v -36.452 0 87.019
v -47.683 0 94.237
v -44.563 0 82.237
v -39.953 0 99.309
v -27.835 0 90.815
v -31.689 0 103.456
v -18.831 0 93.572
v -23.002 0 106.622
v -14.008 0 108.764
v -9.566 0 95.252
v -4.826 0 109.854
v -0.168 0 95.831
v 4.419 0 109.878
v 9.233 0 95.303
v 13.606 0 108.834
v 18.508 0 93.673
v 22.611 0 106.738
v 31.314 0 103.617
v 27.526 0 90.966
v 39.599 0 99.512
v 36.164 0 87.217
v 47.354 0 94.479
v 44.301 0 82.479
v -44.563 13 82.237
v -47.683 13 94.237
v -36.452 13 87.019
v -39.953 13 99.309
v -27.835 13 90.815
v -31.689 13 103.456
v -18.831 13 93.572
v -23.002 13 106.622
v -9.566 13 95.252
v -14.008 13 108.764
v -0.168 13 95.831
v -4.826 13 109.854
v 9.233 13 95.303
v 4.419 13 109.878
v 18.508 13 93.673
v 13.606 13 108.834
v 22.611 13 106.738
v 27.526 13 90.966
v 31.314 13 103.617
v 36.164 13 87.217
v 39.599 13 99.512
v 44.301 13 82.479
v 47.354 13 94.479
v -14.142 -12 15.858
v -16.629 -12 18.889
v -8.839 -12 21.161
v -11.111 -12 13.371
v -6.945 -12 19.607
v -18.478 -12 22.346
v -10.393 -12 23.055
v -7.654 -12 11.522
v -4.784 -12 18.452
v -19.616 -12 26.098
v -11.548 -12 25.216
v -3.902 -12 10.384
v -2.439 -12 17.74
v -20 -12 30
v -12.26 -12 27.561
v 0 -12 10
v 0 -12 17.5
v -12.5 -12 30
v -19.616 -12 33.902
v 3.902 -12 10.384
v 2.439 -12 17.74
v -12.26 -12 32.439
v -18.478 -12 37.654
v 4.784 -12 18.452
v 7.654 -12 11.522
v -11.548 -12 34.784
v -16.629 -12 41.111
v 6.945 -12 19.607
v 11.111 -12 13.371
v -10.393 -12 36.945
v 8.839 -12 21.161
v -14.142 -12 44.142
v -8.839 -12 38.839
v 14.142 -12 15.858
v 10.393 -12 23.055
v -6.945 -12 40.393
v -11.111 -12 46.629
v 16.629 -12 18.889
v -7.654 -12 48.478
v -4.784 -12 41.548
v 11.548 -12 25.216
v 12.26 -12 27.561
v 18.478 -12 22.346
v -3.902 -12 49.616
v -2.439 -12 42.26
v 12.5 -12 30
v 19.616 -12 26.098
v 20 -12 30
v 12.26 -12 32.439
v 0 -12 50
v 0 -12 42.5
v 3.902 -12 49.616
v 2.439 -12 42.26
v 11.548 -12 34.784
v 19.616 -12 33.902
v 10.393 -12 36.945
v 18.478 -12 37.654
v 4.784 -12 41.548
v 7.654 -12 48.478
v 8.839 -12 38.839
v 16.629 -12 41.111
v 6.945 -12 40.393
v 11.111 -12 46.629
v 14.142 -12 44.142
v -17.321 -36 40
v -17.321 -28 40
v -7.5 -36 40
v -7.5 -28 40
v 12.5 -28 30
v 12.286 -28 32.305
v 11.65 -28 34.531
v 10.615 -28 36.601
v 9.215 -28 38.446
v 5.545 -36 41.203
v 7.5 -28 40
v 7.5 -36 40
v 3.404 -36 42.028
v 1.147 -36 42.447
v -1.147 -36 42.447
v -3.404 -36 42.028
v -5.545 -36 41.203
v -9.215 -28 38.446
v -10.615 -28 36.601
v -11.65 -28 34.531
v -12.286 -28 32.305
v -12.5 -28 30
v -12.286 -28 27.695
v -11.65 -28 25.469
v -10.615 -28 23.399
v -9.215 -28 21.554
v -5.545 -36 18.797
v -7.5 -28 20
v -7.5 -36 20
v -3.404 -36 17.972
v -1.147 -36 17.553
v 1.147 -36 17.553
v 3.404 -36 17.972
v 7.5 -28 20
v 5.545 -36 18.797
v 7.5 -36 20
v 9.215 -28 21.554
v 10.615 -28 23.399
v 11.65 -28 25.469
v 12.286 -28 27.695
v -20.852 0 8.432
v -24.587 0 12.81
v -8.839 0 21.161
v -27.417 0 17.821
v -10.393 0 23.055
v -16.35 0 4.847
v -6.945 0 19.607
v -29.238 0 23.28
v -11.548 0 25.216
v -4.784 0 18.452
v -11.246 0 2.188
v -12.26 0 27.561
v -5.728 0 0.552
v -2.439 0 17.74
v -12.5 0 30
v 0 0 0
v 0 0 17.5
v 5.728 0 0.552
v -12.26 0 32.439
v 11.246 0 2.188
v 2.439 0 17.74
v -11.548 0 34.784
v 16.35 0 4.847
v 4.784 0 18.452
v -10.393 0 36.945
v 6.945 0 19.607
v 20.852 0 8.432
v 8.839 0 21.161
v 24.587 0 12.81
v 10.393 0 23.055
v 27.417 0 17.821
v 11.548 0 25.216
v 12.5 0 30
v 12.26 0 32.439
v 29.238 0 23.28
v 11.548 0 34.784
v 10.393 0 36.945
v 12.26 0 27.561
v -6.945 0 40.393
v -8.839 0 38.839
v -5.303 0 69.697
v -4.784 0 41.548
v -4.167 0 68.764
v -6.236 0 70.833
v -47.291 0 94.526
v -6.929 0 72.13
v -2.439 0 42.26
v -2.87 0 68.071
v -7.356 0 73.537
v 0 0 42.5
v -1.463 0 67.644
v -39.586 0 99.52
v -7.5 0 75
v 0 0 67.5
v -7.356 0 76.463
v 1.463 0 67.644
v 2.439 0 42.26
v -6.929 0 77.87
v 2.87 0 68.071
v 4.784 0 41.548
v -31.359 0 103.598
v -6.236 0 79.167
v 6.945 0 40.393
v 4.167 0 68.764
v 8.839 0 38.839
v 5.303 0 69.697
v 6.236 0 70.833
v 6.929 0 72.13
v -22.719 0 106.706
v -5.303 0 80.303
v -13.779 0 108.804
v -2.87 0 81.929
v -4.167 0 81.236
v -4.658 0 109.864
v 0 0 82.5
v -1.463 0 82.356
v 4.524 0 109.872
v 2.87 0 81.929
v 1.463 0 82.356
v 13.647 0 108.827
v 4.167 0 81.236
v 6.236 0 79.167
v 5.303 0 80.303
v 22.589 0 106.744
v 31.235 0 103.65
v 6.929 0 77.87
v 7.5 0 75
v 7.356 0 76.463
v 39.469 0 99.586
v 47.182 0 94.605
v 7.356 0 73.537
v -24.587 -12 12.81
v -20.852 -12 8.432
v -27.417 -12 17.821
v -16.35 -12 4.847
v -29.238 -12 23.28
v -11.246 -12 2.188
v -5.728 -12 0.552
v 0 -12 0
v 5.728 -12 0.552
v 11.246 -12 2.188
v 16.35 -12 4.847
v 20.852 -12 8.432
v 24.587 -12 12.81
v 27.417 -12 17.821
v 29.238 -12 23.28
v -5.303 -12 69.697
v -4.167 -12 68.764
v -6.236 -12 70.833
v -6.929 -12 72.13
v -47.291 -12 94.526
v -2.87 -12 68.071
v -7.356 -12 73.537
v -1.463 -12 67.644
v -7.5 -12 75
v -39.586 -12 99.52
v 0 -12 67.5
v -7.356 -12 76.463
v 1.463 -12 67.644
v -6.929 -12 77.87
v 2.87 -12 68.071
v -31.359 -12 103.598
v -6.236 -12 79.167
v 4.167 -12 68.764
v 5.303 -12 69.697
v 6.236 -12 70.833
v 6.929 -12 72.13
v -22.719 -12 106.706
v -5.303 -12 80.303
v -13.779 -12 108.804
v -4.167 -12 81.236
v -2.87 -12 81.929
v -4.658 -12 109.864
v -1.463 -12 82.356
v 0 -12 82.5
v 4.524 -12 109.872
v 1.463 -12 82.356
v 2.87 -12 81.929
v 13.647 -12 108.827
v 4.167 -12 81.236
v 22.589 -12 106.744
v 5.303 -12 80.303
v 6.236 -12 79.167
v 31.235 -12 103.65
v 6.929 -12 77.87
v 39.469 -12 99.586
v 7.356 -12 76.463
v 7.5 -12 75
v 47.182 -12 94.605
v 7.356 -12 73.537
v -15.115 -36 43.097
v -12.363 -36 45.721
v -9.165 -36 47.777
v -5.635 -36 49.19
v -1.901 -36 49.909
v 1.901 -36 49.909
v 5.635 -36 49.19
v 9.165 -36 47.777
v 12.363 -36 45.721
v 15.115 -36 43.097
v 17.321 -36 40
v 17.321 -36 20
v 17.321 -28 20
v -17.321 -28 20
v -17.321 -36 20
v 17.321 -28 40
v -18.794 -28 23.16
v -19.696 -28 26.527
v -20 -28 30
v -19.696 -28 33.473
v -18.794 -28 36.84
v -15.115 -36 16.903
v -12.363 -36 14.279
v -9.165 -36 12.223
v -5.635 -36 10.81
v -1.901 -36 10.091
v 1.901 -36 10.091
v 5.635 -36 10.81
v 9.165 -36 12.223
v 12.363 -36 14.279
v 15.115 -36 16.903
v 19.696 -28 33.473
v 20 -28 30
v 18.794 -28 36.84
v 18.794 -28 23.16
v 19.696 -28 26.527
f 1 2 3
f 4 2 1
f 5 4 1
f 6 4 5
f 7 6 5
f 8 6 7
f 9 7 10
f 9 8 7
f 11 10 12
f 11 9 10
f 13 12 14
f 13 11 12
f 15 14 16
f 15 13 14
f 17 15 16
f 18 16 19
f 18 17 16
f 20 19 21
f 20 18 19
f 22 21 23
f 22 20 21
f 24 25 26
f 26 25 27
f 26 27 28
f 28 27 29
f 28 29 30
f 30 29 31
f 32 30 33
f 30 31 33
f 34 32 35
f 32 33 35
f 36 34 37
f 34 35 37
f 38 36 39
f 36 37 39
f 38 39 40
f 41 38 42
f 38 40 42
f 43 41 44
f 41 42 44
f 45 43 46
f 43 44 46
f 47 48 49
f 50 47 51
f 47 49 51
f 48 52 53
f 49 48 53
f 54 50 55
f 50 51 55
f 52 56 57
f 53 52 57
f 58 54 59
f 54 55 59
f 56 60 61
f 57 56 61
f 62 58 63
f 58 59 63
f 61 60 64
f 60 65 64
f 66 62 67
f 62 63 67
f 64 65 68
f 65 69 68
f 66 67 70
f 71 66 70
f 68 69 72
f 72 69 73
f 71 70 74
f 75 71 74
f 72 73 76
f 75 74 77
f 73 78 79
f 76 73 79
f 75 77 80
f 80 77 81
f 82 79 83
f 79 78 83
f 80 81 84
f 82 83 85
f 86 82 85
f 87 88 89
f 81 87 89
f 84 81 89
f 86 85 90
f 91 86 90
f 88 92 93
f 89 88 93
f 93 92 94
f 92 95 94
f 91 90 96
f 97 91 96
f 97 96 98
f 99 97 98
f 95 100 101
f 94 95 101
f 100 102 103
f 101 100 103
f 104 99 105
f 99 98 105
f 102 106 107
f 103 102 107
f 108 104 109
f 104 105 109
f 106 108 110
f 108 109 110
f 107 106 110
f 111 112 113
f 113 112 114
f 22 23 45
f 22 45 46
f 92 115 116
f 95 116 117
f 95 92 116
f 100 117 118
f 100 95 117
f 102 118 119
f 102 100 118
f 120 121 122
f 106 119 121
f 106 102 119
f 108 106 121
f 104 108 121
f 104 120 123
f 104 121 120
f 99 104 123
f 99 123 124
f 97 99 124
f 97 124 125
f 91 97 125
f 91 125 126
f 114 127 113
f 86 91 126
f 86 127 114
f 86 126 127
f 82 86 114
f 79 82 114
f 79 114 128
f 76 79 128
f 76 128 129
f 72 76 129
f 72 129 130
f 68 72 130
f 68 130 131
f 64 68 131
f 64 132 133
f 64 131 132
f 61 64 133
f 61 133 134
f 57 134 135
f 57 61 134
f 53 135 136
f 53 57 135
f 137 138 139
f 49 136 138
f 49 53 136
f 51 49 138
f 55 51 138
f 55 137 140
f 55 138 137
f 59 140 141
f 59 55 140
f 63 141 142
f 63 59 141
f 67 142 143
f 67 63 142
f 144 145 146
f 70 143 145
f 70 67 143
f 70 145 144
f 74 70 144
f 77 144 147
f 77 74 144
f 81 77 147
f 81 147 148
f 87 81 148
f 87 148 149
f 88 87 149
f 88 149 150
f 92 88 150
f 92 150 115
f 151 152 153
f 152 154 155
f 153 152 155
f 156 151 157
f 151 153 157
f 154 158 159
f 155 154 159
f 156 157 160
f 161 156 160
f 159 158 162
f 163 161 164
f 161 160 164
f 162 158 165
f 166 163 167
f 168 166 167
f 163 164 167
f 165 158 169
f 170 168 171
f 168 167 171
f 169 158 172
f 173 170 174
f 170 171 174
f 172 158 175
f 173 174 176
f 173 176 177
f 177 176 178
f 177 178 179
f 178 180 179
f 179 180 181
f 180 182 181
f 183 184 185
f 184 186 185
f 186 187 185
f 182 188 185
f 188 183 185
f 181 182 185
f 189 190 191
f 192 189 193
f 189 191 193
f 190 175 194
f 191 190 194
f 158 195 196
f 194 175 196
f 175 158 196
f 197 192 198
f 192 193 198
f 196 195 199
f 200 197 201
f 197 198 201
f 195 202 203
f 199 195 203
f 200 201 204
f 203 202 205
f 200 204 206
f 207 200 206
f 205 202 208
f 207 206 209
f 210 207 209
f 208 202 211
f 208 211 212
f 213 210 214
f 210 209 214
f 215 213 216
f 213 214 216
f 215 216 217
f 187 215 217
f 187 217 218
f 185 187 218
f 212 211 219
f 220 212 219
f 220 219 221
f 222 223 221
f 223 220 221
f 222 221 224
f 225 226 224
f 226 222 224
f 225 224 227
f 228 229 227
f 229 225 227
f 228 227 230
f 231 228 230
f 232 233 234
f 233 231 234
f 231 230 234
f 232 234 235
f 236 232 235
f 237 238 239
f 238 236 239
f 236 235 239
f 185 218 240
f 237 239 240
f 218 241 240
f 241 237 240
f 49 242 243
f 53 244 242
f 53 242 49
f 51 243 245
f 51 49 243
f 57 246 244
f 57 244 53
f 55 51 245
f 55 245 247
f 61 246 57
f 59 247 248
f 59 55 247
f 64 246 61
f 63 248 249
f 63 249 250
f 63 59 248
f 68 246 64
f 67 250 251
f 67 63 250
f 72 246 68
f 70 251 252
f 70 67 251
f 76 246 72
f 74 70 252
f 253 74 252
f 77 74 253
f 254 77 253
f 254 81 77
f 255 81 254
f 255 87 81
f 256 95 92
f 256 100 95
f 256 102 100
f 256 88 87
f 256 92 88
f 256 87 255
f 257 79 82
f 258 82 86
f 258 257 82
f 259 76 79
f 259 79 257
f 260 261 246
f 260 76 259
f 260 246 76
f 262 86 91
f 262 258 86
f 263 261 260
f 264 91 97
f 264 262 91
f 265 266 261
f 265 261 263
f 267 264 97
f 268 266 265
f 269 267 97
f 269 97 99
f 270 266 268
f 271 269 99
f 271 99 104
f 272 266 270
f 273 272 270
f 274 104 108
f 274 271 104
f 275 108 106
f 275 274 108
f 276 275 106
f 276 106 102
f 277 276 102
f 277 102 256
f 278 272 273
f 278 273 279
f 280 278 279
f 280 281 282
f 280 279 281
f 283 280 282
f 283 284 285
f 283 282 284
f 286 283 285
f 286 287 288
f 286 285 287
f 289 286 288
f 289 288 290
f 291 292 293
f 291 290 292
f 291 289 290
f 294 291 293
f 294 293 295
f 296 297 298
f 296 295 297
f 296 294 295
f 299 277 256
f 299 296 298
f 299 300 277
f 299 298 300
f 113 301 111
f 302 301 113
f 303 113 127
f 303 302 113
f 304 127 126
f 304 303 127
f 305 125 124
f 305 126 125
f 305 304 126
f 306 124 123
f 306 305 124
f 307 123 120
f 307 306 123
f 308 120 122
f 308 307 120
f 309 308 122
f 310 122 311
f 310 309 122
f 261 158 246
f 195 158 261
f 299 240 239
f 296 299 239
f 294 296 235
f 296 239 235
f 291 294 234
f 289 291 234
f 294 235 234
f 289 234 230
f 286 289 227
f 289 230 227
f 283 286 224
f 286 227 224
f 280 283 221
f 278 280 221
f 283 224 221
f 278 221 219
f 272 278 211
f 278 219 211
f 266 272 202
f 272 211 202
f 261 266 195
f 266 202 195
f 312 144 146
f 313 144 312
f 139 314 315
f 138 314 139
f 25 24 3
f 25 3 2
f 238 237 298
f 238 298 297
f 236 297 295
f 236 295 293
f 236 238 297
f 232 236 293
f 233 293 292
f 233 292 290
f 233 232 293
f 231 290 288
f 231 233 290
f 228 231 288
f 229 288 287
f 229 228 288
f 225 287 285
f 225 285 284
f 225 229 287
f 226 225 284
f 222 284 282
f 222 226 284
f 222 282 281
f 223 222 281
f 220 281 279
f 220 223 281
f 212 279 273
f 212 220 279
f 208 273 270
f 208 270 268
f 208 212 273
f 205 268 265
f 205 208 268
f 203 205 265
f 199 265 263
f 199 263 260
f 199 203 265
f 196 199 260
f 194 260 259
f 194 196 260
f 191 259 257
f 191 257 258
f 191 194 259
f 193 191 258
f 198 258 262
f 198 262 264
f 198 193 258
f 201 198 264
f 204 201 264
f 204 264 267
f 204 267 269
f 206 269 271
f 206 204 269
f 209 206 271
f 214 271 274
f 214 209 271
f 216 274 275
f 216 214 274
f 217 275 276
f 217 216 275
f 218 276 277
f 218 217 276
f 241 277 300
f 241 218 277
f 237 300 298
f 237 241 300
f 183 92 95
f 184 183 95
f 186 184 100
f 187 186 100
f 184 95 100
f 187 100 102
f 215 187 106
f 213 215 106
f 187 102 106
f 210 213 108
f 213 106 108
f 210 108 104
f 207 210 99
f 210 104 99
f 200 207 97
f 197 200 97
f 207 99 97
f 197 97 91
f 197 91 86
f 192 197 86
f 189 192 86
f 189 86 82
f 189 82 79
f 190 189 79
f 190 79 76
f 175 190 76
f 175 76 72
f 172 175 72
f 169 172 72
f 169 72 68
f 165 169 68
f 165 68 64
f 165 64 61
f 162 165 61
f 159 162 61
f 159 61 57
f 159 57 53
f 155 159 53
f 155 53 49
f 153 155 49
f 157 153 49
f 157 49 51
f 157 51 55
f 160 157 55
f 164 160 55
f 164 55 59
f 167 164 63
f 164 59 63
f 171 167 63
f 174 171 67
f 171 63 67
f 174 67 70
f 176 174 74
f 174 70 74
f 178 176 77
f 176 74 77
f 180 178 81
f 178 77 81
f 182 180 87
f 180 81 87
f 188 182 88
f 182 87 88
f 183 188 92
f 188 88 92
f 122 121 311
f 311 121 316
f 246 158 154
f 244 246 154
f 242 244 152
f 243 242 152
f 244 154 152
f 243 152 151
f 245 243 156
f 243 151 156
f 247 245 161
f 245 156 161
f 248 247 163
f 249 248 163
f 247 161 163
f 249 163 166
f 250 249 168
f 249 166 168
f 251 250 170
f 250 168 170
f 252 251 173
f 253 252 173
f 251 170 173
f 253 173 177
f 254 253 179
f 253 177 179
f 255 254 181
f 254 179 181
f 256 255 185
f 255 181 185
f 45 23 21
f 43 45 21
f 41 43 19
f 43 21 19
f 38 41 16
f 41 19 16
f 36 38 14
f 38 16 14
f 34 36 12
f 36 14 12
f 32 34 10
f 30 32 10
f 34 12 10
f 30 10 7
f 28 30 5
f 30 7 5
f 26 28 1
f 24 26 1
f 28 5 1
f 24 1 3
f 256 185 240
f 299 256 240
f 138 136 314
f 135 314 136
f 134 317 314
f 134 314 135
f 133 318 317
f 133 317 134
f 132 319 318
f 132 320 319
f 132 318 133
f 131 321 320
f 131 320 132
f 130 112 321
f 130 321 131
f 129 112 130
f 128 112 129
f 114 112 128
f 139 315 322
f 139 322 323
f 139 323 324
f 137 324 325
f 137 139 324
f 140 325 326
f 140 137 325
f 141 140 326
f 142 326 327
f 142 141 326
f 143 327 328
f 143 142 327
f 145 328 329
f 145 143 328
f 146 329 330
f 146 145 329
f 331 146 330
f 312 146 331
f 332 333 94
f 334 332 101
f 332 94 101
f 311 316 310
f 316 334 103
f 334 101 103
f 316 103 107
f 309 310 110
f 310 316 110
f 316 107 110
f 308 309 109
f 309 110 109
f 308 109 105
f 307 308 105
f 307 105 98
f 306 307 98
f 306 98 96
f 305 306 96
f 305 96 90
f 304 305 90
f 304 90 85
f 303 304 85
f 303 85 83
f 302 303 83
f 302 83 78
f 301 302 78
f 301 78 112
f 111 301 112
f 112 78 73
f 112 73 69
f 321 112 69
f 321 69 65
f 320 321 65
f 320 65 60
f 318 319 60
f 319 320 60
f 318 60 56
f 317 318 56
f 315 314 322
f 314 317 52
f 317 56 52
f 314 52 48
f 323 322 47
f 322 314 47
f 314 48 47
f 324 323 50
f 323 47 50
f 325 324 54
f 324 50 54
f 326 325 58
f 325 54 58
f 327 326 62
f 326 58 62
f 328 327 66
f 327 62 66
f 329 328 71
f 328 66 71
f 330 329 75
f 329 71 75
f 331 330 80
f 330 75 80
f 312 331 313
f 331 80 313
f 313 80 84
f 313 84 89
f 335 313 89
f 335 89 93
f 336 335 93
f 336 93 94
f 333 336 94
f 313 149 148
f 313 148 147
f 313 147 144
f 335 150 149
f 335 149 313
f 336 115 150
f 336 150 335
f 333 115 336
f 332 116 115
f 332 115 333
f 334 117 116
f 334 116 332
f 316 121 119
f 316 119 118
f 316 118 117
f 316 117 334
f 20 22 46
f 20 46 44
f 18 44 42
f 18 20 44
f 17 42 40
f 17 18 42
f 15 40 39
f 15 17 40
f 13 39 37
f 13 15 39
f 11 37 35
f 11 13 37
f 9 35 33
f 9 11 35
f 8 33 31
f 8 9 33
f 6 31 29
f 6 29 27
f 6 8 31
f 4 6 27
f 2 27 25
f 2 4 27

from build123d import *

# Parameters (mm, degrees)
SKETCH_R     = 7.5
PAD_DEPTH    = 12
SKETCH005_R  = 12.5
POCKET_DEPTH = 12.001
PAD001_DEPTH = 13
SKETCH004_W  = 40
SKETCH004_H  = 20
PAD004_DEPTH = 8
SKETCH003_R  = 12.5
PAD003_DEPTH = 36
SKETCH002_R  = 20
PAD002_DEPTH = 24


with BuildPart() as body:
    # Sketch → Pad (new body)
    with BuildSketch(Plane.XZ):
        with BuildLine():
            ThreePointArc((-29.23775, 23.280331), (0, 0), (29.23775, 23.280331))
            Line((29.23775, 23.280331), (47.182434, 94.605092))
            ThreePointArc((47.182434, 94.605092), (-0.06739, 109.999972), (-47.29121, 94.52551))
            Line((-29.23775, 23.280331), (-47.29121, 94.52551))
        make_face()
        with Locations((0, 75)):
            Circle(SKETCH_R, mode=Mode.SUBTRACT)
    extrude(amount=PAD_DEPTH)

    # Sketch005 (on Face7 of Pad) → Pocket (cut, through all)
    with BuildSketch(Plane.XZ.offset(12)):
        with Locations((0, 30)):
            Circle(SKETCH005_R)
    extrude(amount=-POCKET_DEPTH, mode=Mode.SUBTRACT)


with BuildPart() as body001:
    # Sketch001 → Pad001 (new body)
    with BuildSketch(Plane.XZ):
        with BuildLine():
            ThreePointArc((47.354468, 94.4791), (-0.203921, 109.99974), (-47.682568, 94.236849))
            Line((-44.563223, 82.236849), (-47.682568, 94.236849))
            ThreePointArc((44.301036, 82.4791), (-0.167824, 95.831455), (-44.563223, 82.236849))
            Line((44.301036, 82.4791), (47.354468, 94.4791))
        make_face()
    extrude(amount=-PAD001_DEPTH)


with BuildPart() as rectangulo:
    # Sketch004 → Pad004 (new body)
    with BuildSketch(Plane.XZ):
        with Locations((0, 30)):
            Rectangle(SKETCH004_W, SKETCH004_H)
    extrude(amount=PAD004_DEPTH)


with BuildPart() as rectangulo_1:
    # Body004 placement: moved
    add(rectangulo.part.moved(Location((0, -28, 0))))


with BuildPart() as body003:
    # Sketch003 → Pad003 (new body)
    with BuildSketch(Plane.XZ):
        with Locations((0, 30)):
            Circle(SKETCH003_R)
    extrude(amount=PAD003_DEPTH)


with BuildPart() as cut001:
    # Sketch002 → Pad002 (new body)
    with BuildSketch(Plane.XZ):
        with Locations((0, 30)):
            Circle(SKETCH002_R)
    extrude(amount=PAD002_DEPTH)


with BuildPart() as cut001_1:
    # Body002 placement: moved
    add(cut001.part.moved(Location((0, -12, 0))))

    # Cut: cut Body003
    add(body003.part, mode=Mode.SUBTRACT)

    # Cut001: cut Rectangulo
    add(rectangulo_1.part, mode=Mode.SUBTRACT)


solid = Compound([body.part, body001.part, cut001_1.part])
